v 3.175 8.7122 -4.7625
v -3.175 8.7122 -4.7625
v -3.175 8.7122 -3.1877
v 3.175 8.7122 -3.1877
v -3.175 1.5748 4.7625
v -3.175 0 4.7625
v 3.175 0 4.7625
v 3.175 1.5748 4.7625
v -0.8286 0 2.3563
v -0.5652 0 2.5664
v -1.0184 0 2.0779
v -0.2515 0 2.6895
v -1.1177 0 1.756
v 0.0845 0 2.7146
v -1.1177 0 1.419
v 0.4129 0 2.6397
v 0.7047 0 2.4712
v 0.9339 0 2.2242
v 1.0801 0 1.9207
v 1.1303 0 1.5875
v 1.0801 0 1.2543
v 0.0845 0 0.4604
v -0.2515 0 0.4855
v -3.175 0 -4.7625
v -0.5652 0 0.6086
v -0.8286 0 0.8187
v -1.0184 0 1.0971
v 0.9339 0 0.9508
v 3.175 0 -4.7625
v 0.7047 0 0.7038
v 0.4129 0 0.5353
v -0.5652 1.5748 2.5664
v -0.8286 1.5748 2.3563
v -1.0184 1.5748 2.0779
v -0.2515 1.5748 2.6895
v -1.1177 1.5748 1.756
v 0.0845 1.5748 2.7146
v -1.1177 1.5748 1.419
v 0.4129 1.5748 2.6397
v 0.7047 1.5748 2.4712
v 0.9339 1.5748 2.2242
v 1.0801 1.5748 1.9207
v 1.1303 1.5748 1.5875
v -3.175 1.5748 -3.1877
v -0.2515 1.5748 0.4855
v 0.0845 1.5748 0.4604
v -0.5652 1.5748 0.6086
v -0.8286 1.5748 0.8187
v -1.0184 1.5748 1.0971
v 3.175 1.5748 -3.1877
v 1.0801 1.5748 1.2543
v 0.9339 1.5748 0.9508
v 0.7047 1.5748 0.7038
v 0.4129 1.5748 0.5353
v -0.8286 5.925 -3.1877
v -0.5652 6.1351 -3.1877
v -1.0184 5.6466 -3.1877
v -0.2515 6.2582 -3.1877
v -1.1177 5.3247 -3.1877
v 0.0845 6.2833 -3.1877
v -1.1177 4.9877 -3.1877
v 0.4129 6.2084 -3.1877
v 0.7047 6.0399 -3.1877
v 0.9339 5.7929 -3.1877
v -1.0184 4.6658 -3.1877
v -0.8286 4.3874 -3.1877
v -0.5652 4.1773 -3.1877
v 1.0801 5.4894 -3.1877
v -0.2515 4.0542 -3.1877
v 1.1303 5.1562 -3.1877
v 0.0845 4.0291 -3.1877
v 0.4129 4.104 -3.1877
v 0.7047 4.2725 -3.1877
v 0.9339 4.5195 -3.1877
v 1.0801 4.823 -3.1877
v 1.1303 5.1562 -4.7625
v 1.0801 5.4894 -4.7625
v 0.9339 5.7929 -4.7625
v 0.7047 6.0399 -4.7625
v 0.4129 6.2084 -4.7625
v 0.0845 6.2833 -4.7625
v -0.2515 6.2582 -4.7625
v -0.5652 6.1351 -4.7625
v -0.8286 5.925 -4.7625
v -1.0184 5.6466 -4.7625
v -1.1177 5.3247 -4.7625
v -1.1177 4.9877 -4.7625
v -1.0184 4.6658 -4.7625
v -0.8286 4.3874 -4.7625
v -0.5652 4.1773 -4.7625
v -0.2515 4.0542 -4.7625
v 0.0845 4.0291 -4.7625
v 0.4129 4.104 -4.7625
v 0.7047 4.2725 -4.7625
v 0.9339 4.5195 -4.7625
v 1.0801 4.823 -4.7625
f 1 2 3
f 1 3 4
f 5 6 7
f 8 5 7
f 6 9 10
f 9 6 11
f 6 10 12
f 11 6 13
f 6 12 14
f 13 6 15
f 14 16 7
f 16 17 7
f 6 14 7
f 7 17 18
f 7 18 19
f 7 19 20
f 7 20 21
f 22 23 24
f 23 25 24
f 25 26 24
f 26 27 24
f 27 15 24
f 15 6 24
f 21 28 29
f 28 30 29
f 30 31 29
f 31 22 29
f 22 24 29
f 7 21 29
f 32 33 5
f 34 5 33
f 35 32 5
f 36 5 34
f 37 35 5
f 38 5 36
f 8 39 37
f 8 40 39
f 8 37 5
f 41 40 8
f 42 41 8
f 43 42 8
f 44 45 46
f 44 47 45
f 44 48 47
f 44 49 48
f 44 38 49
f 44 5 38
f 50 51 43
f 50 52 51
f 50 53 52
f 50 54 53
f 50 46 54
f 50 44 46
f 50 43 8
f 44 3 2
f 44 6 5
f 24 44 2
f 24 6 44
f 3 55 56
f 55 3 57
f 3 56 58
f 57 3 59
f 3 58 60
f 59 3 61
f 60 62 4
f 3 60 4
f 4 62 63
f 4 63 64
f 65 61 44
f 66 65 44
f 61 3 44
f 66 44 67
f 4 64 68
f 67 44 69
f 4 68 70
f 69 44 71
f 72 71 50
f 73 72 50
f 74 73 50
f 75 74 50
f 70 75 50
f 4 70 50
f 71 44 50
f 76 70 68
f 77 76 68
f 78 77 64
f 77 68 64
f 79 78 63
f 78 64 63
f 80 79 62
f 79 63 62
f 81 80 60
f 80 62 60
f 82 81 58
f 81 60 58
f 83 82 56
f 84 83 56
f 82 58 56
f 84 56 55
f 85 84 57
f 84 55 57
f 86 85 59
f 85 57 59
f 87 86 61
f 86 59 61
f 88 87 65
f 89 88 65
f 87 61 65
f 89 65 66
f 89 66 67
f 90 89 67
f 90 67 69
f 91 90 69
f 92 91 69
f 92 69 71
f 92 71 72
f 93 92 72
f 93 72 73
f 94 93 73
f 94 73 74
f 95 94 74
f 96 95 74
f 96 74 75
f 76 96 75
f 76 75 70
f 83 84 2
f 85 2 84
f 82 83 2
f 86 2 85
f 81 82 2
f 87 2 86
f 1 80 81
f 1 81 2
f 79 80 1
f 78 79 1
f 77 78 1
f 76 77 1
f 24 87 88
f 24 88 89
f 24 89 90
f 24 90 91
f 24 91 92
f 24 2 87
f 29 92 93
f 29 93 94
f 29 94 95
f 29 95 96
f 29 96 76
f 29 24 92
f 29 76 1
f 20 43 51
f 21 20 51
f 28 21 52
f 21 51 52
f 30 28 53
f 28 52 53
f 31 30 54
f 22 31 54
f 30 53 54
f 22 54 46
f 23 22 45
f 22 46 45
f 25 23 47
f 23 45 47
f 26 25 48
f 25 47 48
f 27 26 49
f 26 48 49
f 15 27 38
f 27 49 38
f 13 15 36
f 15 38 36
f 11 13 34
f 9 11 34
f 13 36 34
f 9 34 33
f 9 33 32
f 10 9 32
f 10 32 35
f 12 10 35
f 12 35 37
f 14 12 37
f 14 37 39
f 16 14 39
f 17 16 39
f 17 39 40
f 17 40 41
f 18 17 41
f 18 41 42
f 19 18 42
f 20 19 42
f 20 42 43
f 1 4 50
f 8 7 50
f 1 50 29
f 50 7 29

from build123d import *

# Parameters (mm, degrees)
SKETCH1_W           = 6.35
SKETCH1_H           = 9.525
BOSS_EXTRUDE1_DEPTH = 1.5748
SKETCH2_R           = 1.1303
CUT_EXTRUDE1_DEPTH  = 2.5748
SKETCH3_W           = 6.35
SKETCH3_H           = 1.5748
BOSS_EXTRUDE2_DEPTH = 7.1374
SKETCH4_R           = 1.1303
CUT_EXTRUDE2_DEPTH  = 2.5748


with BuildPart() as part:
    # Sketch1 → Boss-Extrude1 (new body)
    with BuildSketch(Plane(origin=(0, 0, 0), x_dir=(1, 0, 0), z_dir=(0, 1, 0))):
        Rectangle(SKETCH1_W, SKETCH1_H)
    extrude(amount=BOSS_EXTRUDE1_DEPTH)

    # Sketch2 → Cut-Extrude1 (cut, through all)
    with BuildSketch(Plane(origin=(0, 1.5748, 0), x_dir=(1, 0, 0), z_dir=(0, 1, 0))):
        with Locations((0, -1.5875)):
            Circle(SKETCH2_R)
    extrude(amount=-CUT_EXTRUDE1_DEPTH, mode=Mode.SUBTRACT)

    # Sketch3 → Boss-Extrude2 (add)
    with BuildSketch(Plane(origin=(0, 1.5748, 0), x_dir=(1, 0, 0), z_dir=(0, 1, 0))):
        with Locations((0, 3.9751)):
            Rectangle(SKETCH3_W, SKETCH3_H)
    extrude(amount=BOSS_EXTRUDE2_DEPTH)

    # Sketch4 → Cut-Extrude2 (cut, through all)
    with BuildSketch(Plane.XY.offset(-3.1877)):
        with Locations((0, 5.1562)):
            Circle(SKETCH4_R)
    extrude(amount=-CUT_EXTRUDE2_DEPTH, mode=Mode.SUBTRACT)


solid = part.part
